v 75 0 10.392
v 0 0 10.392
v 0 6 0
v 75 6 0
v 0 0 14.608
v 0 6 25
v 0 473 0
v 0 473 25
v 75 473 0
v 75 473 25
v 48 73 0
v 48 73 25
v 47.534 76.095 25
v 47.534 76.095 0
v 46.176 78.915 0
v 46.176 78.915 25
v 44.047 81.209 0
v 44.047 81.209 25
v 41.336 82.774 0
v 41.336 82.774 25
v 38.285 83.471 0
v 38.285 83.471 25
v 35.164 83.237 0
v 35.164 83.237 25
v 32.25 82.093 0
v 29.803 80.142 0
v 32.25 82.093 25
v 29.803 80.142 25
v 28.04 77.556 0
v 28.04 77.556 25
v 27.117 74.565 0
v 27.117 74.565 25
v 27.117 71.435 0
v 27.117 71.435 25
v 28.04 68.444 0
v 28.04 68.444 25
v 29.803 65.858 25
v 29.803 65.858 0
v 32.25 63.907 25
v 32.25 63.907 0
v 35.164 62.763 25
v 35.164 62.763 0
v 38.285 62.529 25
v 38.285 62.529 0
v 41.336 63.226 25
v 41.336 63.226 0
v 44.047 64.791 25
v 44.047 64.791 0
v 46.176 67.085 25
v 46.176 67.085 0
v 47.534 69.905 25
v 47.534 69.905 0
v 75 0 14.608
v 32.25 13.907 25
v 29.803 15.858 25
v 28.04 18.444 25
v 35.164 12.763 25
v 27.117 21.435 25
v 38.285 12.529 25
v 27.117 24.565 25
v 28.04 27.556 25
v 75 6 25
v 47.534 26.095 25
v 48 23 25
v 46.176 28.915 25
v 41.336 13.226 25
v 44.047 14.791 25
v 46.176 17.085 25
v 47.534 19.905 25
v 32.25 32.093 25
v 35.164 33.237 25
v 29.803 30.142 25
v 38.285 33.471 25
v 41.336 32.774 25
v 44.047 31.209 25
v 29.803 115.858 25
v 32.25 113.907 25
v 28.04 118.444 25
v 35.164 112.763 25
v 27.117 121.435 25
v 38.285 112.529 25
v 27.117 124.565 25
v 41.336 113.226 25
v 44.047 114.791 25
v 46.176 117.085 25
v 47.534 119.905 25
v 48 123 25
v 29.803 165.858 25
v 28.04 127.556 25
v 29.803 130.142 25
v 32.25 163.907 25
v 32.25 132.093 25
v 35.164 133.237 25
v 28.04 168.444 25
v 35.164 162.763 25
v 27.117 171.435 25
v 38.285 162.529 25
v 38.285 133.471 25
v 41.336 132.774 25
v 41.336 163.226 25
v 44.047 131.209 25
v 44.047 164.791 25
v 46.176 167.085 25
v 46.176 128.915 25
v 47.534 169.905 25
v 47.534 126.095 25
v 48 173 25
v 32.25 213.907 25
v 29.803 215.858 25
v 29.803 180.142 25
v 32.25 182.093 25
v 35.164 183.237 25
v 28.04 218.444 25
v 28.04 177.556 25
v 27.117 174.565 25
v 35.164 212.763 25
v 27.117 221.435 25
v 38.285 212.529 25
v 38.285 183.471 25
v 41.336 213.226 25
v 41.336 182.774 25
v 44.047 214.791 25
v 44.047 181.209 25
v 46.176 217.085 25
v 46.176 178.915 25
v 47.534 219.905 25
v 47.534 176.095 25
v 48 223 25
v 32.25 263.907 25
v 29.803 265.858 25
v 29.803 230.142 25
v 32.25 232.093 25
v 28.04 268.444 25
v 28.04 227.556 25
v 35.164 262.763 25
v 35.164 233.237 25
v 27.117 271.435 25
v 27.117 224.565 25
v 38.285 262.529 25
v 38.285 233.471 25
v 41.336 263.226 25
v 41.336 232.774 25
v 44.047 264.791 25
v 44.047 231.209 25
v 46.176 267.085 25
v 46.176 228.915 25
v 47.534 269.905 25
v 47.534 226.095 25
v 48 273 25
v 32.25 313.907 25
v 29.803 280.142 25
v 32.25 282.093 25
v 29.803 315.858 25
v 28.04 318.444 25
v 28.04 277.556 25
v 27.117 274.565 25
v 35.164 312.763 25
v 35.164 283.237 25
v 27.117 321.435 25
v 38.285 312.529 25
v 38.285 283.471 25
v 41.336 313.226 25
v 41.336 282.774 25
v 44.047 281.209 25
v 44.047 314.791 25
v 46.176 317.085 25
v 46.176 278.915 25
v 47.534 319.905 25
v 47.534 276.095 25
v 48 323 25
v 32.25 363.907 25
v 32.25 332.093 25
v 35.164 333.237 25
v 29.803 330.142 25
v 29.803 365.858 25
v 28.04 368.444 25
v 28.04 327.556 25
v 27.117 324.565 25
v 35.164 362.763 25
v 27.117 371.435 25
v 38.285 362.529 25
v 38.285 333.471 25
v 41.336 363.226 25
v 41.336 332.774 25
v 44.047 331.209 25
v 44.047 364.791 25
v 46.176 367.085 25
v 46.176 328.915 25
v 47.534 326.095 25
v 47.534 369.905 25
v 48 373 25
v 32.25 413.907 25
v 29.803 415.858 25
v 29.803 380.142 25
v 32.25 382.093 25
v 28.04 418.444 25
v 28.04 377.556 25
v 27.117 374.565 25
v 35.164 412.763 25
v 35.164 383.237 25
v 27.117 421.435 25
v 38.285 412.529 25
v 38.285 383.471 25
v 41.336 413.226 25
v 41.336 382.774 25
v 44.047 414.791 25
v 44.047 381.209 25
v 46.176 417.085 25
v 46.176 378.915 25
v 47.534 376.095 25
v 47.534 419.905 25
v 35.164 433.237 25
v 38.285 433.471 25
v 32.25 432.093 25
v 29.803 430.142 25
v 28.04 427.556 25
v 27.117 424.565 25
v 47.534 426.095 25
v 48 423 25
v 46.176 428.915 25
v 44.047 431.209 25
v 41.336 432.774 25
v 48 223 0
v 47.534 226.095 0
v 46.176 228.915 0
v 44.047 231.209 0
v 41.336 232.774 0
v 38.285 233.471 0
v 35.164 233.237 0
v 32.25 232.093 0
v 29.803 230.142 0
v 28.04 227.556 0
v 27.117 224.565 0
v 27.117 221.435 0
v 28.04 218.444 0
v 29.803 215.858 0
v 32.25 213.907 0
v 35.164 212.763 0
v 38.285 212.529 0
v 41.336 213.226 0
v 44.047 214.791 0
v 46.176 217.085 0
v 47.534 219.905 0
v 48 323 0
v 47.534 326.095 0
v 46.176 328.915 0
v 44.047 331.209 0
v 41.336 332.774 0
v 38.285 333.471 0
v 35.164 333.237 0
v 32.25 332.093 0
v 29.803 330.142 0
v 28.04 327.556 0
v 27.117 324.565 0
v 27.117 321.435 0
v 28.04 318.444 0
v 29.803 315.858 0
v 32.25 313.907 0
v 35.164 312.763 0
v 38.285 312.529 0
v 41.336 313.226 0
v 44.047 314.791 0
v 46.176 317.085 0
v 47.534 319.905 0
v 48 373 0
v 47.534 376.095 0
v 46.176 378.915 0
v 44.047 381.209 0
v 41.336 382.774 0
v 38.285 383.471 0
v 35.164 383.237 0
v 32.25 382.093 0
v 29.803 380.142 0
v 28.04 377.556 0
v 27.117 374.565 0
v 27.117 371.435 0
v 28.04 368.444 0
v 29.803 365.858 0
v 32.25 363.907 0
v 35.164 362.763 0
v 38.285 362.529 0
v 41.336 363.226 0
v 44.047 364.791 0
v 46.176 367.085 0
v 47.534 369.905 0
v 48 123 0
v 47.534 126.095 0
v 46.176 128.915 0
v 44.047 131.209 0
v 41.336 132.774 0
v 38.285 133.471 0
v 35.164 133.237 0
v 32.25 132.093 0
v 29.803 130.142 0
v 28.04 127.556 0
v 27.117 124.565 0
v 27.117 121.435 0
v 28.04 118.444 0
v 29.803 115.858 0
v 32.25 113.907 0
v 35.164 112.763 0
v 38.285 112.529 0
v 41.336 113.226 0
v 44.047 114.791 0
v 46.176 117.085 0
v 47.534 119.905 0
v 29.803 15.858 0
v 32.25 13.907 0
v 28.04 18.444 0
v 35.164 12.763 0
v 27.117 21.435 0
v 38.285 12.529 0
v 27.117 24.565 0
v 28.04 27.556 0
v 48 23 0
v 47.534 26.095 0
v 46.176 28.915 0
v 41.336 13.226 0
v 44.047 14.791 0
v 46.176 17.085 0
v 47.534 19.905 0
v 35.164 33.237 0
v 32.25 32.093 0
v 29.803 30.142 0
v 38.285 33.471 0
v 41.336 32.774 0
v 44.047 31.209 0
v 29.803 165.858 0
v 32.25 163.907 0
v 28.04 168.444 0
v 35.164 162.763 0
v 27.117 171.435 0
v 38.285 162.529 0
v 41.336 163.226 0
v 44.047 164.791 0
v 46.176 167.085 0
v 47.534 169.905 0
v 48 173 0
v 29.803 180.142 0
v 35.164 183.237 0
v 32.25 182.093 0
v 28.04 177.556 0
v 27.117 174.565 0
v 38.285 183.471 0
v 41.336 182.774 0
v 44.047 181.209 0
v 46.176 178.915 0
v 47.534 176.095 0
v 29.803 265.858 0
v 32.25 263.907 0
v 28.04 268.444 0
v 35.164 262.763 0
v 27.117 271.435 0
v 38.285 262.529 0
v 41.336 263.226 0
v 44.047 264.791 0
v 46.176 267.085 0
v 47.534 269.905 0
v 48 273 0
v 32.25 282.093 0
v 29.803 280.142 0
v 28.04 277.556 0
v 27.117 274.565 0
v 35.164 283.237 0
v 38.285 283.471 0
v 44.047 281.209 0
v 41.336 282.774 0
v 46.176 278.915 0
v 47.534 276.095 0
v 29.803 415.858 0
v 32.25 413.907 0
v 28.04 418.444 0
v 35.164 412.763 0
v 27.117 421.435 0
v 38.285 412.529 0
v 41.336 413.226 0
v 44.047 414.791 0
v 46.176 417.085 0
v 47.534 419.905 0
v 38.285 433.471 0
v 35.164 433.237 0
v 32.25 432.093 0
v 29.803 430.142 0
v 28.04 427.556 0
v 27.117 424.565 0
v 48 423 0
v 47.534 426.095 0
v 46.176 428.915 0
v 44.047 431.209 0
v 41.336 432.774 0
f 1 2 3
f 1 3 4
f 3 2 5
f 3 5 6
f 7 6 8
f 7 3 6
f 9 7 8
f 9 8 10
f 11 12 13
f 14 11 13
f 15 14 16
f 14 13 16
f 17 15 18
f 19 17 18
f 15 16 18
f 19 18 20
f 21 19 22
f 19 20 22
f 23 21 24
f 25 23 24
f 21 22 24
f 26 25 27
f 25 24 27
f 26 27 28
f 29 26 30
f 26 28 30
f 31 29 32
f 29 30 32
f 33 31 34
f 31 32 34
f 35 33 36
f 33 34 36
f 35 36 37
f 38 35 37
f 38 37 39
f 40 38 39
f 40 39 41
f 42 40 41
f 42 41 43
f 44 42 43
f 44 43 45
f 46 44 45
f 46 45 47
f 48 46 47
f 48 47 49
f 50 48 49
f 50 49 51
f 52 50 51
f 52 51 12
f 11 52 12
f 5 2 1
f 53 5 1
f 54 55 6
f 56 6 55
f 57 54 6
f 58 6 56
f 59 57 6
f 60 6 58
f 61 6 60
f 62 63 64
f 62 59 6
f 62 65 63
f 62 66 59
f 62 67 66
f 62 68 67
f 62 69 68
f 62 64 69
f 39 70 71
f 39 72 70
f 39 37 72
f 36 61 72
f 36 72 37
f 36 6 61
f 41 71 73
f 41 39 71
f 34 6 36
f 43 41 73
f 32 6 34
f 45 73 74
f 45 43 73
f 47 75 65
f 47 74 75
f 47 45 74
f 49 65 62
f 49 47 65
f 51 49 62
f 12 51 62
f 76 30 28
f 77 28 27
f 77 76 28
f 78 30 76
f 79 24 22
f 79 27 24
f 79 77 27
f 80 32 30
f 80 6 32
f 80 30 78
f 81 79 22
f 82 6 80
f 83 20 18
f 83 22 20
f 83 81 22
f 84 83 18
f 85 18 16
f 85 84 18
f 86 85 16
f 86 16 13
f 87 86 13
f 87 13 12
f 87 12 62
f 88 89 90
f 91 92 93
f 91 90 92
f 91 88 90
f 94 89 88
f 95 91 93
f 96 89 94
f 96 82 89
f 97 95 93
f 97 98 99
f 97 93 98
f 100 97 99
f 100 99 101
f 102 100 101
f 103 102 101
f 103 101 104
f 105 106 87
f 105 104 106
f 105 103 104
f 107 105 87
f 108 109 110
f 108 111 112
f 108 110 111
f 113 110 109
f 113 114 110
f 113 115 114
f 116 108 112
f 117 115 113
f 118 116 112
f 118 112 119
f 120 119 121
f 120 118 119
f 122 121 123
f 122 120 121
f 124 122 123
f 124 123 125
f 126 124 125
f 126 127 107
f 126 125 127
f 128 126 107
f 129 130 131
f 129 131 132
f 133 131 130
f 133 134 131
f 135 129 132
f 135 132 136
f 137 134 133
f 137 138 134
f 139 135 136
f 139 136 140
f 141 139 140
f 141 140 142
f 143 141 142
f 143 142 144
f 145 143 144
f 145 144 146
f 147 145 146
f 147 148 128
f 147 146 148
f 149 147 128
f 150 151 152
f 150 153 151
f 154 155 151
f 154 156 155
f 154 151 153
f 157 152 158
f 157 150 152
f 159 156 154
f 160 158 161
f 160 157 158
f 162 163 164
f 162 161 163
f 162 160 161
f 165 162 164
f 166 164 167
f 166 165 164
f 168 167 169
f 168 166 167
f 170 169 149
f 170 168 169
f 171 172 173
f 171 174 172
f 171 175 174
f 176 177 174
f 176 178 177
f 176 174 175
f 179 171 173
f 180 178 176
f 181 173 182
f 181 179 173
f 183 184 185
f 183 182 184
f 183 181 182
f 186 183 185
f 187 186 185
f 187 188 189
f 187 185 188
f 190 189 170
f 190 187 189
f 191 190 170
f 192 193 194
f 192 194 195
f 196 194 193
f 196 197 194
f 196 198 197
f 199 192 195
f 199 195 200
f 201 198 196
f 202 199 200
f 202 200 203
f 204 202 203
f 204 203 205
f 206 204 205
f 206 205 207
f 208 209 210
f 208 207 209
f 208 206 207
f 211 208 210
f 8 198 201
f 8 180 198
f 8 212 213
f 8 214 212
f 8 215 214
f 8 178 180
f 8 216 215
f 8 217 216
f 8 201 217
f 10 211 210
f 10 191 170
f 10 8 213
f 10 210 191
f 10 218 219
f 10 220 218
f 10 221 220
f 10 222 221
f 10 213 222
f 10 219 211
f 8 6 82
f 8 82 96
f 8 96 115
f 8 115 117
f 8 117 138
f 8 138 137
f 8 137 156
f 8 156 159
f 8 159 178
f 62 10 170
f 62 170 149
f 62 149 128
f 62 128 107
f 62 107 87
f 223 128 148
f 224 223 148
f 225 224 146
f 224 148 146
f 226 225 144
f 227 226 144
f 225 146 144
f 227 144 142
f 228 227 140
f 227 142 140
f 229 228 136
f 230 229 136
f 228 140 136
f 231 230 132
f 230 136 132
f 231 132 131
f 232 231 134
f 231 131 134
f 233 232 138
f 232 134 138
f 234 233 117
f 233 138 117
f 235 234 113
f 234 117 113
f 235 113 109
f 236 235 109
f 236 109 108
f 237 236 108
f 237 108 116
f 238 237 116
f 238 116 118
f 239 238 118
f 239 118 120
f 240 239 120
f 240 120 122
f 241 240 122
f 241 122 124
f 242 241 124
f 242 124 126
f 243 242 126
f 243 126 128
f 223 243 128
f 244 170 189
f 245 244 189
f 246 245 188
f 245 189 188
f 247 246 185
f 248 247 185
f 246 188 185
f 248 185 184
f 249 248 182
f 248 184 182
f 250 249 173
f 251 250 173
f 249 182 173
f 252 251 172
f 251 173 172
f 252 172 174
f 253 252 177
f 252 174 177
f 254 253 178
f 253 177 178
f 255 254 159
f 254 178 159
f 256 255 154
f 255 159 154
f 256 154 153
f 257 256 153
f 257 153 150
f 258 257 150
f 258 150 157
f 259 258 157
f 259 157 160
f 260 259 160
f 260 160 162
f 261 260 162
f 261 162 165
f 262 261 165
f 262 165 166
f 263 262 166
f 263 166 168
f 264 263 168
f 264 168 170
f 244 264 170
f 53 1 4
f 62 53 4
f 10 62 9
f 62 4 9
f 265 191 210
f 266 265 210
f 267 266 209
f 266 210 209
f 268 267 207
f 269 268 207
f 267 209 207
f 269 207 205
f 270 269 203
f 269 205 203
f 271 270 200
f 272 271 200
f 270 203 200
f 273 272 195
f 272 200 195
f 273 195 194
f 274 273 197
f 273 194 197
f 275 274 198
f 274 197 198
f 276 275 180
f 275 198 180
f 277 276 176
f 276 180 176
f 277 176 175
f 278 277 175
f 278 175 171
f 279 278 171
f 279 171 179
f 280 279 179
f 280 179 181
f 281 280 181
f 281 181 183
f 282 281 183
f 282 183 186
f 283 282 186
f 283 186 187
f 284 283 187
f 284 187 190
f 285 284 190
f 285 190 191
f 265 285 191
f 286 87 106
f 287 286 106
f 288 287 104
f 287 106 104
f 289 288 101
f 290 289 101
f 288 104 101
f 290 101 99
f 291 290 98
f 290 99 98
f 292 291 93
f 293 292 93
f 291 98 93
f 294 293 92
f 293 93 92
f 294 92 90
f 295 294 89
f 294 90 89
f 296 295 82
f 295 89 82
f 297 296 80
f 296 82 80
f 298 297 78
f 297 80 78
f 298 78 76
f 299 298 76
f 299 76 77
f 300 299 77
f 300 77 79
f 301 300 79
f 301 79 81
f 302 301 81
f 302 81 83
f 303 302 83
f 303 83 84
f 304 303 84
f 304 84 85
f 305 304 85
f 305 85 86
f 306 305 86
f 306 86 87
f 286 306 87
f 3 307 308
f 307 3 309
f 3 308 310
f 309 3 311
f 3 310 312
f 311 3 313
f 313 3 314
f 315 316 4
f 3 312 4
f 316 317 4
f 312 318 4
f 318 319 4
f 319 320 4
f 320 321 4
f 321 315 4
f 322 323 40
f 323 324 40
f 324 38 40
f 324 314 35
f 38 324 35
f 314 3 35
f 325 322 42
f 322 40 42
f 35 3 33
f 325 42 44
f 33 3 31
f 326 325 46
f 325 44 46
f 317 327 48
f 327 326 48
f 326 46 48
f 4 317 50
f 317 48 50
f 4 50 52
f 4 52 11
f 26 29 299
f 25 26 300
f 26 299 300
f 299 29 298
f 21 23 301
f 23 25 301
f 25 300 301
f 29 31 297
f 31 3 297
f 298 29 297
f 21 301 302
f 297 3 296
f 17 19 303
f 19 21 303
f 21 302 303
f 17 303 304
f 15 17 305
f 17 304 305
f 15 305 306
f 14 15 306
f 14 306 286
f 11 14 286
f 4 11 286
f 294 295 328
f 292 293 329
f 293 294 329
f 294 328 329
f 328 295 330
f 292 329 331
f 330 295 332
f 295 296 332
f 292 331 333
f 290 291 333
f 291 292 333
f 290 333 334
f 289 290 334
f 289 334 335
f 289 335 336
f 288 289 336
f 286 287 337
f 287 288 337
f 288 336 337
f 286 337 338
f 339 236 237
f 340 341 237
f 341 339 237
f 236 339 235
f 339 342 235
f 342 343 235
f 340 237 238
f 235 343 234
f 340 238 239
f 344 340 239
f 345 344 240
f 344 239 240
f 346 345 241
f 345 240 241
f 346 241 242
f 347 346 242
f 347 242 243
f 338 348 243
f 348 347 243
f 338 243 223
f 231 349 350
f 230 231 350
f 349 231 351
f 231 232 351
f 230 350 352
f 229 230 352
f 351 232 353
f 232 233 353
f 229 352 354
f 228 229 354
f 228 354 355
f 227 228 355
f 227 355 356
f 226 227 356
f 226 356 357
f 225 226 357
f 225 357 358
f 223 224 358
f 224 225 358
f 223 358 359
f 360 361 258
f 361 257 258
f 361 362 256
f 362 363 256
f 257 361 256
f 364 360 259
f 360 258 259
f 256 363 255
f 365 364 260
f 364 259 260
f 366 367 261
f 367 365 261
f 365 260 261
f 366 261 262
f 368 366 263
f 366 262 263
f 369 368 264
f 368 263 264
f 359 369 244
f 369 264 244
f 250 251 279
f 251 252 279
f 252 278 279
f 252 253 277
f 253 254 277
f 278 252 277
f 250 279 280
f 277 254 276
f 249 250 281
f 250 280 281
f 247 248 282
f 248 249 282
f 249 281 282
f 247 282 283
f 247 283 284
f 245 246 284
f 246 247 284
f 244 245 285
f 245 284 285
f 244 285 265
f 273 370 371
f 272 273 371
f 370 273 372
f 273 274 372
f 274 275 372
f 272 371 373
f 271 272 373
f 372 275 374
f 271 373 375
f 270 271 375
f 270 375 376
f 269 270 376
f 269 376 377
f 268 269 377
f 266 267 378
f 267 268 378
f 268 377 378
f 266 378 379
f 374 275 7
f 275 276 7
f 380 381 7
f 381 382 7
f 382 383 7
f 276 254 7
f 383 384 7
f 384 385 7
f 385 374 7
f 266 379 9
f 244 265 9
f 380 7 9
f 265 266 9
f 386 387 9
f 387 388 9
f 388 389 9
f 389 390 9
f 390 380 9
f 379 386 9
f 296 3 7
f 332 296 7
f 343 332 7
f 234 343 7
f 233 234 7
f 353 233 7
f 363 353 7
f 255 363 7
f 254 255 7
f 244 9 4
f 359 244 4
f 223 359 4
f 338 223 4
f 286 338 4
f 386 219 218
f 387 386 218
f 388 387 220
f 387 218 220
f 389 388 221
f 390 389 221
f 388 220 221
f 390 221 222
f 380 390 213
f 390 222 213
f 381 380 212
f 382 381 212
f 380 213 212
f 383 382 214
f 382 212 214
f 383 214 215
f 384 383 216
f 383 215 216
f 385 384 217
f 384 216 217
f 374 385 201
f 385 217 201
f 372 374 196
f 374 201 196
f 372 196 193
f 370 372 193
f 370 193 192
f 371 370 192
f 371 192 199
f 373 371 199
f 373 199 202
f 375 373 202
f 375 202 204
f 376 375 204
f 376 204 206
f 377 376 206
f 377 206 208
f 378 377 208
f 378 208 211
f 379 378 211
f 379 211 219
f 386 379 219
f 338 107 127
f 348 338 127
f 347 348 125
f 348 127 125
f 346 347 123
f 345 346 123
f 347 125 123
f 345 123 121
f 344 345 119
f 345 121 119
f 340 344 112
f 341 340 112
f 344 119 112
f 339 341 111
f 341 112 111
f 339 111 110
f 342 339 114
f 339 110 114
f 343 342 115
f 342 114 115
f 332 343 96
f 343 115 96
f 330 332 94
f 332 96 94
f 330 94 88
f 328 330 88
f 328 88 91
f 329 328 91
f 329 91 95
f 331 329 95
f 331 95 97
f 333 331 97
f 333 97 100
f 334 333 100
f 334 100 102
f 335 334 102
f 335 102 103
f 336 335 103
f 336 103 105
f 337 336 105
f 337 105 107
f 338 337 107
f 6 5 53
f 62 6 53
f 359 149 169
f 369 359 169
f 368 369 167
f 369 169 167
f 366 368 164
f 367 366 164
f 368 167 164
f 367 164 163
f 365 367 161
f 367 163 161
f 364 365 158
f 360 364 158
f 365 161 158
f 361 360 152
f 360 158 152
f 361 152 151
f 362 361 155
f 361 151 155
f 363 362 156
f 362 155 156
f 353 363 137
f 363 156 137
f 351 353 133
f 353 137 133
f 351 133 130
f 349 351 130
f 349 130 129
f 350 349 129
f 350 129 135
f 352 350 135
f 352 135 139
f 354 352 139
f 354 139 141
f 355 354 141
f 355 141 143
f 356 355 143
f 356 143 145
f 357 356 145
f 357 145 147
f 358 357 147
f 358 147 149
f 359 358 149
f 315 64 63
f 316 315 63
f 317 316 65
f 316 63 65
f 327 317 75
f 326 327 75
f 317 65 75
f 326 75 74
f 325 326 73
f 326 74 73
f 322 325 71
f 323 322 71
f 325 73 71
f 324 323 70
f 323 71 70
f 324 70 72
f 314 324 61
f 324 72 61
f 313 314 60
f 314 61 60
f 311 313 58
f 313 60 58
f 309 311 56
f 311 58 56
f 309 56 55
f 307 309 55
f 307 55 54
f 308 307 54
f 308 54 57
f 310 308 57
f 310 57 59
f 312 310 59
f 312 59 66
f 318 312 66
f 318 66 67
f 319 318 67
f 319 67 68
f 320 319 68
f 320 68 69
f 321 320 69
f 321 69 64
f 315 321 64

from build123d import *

# Parameters (mm, degrees)
SKETCH_1_W          = 75
SKETCH_1_H          = 473
EXTRUDE_1_DEPTH     = 25
SKETCH_2_R          = 10.5
CUT_EXTRUDE_1_DEPTH = 26
CHAMFER_1_SIZE      = 6
CHAMFER_1_SIZE2     = 10.392304845
CHAMFER_2_SIZE      = 6
CHAMFER_2_SIZE2     = 10.392304845


with BuildPart() as part:
    # Эскиз1 → Бобышка-Вытянуть1 (new body)
    with BuildSketch(Plane.XY):
        with Locations((37.5, 236.5)):
            Rectangle(SKETCH_1_W, SKETCH_1_H)
    extrude(amount=EXTRUDE_1_DEPTH)

    # Эскиз2 → Вырез-Вытянуть1 (cut, through all)
    with BuildSketch(Plane.XY.offset(25)):
        with Locations((37.5, 23)):
            Circle(SKETCH_2_R)
        with Locations((37.5, 73)):
            Circle(SKETCH_2_R)
        with Locations((37.5, 123)):
            Circle(SKETCH_2_R)
        with Locations((37.5, 173)):
            Circle(SKETCH_2_R)
        with Locations((37.5, 223)):
            Circle(SKETCH_2_R)
        with Locations((37.5, 273)):
            Circle(SKETCH_2_R)
        with Locations((37.5, 323)):
            Circle(SKETCH_2_R)
        with Locations((37.5, 373)):
            Circle(SKETCH_2_R)
        with Locations((37.5, 423)):
            Circle(SKETCH_2_R)
    extrude(amount=-CUT_EXTRUDE_1_DEPTH, mode=Mode.SUBTRACT)

    # Фаска1
    chamfer_1_edges = [part.edges().sort_by_distance(p)[0] for p in [
        (37.5, 0, 0),
    ]]
    chamfer_1_side = [part.faces().sort_by_distance(p)[0] for p in [
        (37.5, 237.800547955, 0),
    ]]
    chamfer(chamfer_1_edges, length=CHAMFER_1_SIZE, length2=CHAMFER_1_SIZE2, reference=chamfer_1_side[0])

    # Фаска2
    chamfer_2_edges = [part.edges().sort_by_distance(p)[0] for p in [
        (37.5, 0, 25),
    ]]
    chamfer_2_side = [part.faces().sort_by_distance(p)[0] for p in [
        (37.5, 237.800547955, 25),
    ]]
    chamfer(chamfer_2_edges, length=CHAMFER_2_SIZE, length2=CHAMFER_2_SIZE2, reference=chamfer_2_side[0])


solid = part.part
